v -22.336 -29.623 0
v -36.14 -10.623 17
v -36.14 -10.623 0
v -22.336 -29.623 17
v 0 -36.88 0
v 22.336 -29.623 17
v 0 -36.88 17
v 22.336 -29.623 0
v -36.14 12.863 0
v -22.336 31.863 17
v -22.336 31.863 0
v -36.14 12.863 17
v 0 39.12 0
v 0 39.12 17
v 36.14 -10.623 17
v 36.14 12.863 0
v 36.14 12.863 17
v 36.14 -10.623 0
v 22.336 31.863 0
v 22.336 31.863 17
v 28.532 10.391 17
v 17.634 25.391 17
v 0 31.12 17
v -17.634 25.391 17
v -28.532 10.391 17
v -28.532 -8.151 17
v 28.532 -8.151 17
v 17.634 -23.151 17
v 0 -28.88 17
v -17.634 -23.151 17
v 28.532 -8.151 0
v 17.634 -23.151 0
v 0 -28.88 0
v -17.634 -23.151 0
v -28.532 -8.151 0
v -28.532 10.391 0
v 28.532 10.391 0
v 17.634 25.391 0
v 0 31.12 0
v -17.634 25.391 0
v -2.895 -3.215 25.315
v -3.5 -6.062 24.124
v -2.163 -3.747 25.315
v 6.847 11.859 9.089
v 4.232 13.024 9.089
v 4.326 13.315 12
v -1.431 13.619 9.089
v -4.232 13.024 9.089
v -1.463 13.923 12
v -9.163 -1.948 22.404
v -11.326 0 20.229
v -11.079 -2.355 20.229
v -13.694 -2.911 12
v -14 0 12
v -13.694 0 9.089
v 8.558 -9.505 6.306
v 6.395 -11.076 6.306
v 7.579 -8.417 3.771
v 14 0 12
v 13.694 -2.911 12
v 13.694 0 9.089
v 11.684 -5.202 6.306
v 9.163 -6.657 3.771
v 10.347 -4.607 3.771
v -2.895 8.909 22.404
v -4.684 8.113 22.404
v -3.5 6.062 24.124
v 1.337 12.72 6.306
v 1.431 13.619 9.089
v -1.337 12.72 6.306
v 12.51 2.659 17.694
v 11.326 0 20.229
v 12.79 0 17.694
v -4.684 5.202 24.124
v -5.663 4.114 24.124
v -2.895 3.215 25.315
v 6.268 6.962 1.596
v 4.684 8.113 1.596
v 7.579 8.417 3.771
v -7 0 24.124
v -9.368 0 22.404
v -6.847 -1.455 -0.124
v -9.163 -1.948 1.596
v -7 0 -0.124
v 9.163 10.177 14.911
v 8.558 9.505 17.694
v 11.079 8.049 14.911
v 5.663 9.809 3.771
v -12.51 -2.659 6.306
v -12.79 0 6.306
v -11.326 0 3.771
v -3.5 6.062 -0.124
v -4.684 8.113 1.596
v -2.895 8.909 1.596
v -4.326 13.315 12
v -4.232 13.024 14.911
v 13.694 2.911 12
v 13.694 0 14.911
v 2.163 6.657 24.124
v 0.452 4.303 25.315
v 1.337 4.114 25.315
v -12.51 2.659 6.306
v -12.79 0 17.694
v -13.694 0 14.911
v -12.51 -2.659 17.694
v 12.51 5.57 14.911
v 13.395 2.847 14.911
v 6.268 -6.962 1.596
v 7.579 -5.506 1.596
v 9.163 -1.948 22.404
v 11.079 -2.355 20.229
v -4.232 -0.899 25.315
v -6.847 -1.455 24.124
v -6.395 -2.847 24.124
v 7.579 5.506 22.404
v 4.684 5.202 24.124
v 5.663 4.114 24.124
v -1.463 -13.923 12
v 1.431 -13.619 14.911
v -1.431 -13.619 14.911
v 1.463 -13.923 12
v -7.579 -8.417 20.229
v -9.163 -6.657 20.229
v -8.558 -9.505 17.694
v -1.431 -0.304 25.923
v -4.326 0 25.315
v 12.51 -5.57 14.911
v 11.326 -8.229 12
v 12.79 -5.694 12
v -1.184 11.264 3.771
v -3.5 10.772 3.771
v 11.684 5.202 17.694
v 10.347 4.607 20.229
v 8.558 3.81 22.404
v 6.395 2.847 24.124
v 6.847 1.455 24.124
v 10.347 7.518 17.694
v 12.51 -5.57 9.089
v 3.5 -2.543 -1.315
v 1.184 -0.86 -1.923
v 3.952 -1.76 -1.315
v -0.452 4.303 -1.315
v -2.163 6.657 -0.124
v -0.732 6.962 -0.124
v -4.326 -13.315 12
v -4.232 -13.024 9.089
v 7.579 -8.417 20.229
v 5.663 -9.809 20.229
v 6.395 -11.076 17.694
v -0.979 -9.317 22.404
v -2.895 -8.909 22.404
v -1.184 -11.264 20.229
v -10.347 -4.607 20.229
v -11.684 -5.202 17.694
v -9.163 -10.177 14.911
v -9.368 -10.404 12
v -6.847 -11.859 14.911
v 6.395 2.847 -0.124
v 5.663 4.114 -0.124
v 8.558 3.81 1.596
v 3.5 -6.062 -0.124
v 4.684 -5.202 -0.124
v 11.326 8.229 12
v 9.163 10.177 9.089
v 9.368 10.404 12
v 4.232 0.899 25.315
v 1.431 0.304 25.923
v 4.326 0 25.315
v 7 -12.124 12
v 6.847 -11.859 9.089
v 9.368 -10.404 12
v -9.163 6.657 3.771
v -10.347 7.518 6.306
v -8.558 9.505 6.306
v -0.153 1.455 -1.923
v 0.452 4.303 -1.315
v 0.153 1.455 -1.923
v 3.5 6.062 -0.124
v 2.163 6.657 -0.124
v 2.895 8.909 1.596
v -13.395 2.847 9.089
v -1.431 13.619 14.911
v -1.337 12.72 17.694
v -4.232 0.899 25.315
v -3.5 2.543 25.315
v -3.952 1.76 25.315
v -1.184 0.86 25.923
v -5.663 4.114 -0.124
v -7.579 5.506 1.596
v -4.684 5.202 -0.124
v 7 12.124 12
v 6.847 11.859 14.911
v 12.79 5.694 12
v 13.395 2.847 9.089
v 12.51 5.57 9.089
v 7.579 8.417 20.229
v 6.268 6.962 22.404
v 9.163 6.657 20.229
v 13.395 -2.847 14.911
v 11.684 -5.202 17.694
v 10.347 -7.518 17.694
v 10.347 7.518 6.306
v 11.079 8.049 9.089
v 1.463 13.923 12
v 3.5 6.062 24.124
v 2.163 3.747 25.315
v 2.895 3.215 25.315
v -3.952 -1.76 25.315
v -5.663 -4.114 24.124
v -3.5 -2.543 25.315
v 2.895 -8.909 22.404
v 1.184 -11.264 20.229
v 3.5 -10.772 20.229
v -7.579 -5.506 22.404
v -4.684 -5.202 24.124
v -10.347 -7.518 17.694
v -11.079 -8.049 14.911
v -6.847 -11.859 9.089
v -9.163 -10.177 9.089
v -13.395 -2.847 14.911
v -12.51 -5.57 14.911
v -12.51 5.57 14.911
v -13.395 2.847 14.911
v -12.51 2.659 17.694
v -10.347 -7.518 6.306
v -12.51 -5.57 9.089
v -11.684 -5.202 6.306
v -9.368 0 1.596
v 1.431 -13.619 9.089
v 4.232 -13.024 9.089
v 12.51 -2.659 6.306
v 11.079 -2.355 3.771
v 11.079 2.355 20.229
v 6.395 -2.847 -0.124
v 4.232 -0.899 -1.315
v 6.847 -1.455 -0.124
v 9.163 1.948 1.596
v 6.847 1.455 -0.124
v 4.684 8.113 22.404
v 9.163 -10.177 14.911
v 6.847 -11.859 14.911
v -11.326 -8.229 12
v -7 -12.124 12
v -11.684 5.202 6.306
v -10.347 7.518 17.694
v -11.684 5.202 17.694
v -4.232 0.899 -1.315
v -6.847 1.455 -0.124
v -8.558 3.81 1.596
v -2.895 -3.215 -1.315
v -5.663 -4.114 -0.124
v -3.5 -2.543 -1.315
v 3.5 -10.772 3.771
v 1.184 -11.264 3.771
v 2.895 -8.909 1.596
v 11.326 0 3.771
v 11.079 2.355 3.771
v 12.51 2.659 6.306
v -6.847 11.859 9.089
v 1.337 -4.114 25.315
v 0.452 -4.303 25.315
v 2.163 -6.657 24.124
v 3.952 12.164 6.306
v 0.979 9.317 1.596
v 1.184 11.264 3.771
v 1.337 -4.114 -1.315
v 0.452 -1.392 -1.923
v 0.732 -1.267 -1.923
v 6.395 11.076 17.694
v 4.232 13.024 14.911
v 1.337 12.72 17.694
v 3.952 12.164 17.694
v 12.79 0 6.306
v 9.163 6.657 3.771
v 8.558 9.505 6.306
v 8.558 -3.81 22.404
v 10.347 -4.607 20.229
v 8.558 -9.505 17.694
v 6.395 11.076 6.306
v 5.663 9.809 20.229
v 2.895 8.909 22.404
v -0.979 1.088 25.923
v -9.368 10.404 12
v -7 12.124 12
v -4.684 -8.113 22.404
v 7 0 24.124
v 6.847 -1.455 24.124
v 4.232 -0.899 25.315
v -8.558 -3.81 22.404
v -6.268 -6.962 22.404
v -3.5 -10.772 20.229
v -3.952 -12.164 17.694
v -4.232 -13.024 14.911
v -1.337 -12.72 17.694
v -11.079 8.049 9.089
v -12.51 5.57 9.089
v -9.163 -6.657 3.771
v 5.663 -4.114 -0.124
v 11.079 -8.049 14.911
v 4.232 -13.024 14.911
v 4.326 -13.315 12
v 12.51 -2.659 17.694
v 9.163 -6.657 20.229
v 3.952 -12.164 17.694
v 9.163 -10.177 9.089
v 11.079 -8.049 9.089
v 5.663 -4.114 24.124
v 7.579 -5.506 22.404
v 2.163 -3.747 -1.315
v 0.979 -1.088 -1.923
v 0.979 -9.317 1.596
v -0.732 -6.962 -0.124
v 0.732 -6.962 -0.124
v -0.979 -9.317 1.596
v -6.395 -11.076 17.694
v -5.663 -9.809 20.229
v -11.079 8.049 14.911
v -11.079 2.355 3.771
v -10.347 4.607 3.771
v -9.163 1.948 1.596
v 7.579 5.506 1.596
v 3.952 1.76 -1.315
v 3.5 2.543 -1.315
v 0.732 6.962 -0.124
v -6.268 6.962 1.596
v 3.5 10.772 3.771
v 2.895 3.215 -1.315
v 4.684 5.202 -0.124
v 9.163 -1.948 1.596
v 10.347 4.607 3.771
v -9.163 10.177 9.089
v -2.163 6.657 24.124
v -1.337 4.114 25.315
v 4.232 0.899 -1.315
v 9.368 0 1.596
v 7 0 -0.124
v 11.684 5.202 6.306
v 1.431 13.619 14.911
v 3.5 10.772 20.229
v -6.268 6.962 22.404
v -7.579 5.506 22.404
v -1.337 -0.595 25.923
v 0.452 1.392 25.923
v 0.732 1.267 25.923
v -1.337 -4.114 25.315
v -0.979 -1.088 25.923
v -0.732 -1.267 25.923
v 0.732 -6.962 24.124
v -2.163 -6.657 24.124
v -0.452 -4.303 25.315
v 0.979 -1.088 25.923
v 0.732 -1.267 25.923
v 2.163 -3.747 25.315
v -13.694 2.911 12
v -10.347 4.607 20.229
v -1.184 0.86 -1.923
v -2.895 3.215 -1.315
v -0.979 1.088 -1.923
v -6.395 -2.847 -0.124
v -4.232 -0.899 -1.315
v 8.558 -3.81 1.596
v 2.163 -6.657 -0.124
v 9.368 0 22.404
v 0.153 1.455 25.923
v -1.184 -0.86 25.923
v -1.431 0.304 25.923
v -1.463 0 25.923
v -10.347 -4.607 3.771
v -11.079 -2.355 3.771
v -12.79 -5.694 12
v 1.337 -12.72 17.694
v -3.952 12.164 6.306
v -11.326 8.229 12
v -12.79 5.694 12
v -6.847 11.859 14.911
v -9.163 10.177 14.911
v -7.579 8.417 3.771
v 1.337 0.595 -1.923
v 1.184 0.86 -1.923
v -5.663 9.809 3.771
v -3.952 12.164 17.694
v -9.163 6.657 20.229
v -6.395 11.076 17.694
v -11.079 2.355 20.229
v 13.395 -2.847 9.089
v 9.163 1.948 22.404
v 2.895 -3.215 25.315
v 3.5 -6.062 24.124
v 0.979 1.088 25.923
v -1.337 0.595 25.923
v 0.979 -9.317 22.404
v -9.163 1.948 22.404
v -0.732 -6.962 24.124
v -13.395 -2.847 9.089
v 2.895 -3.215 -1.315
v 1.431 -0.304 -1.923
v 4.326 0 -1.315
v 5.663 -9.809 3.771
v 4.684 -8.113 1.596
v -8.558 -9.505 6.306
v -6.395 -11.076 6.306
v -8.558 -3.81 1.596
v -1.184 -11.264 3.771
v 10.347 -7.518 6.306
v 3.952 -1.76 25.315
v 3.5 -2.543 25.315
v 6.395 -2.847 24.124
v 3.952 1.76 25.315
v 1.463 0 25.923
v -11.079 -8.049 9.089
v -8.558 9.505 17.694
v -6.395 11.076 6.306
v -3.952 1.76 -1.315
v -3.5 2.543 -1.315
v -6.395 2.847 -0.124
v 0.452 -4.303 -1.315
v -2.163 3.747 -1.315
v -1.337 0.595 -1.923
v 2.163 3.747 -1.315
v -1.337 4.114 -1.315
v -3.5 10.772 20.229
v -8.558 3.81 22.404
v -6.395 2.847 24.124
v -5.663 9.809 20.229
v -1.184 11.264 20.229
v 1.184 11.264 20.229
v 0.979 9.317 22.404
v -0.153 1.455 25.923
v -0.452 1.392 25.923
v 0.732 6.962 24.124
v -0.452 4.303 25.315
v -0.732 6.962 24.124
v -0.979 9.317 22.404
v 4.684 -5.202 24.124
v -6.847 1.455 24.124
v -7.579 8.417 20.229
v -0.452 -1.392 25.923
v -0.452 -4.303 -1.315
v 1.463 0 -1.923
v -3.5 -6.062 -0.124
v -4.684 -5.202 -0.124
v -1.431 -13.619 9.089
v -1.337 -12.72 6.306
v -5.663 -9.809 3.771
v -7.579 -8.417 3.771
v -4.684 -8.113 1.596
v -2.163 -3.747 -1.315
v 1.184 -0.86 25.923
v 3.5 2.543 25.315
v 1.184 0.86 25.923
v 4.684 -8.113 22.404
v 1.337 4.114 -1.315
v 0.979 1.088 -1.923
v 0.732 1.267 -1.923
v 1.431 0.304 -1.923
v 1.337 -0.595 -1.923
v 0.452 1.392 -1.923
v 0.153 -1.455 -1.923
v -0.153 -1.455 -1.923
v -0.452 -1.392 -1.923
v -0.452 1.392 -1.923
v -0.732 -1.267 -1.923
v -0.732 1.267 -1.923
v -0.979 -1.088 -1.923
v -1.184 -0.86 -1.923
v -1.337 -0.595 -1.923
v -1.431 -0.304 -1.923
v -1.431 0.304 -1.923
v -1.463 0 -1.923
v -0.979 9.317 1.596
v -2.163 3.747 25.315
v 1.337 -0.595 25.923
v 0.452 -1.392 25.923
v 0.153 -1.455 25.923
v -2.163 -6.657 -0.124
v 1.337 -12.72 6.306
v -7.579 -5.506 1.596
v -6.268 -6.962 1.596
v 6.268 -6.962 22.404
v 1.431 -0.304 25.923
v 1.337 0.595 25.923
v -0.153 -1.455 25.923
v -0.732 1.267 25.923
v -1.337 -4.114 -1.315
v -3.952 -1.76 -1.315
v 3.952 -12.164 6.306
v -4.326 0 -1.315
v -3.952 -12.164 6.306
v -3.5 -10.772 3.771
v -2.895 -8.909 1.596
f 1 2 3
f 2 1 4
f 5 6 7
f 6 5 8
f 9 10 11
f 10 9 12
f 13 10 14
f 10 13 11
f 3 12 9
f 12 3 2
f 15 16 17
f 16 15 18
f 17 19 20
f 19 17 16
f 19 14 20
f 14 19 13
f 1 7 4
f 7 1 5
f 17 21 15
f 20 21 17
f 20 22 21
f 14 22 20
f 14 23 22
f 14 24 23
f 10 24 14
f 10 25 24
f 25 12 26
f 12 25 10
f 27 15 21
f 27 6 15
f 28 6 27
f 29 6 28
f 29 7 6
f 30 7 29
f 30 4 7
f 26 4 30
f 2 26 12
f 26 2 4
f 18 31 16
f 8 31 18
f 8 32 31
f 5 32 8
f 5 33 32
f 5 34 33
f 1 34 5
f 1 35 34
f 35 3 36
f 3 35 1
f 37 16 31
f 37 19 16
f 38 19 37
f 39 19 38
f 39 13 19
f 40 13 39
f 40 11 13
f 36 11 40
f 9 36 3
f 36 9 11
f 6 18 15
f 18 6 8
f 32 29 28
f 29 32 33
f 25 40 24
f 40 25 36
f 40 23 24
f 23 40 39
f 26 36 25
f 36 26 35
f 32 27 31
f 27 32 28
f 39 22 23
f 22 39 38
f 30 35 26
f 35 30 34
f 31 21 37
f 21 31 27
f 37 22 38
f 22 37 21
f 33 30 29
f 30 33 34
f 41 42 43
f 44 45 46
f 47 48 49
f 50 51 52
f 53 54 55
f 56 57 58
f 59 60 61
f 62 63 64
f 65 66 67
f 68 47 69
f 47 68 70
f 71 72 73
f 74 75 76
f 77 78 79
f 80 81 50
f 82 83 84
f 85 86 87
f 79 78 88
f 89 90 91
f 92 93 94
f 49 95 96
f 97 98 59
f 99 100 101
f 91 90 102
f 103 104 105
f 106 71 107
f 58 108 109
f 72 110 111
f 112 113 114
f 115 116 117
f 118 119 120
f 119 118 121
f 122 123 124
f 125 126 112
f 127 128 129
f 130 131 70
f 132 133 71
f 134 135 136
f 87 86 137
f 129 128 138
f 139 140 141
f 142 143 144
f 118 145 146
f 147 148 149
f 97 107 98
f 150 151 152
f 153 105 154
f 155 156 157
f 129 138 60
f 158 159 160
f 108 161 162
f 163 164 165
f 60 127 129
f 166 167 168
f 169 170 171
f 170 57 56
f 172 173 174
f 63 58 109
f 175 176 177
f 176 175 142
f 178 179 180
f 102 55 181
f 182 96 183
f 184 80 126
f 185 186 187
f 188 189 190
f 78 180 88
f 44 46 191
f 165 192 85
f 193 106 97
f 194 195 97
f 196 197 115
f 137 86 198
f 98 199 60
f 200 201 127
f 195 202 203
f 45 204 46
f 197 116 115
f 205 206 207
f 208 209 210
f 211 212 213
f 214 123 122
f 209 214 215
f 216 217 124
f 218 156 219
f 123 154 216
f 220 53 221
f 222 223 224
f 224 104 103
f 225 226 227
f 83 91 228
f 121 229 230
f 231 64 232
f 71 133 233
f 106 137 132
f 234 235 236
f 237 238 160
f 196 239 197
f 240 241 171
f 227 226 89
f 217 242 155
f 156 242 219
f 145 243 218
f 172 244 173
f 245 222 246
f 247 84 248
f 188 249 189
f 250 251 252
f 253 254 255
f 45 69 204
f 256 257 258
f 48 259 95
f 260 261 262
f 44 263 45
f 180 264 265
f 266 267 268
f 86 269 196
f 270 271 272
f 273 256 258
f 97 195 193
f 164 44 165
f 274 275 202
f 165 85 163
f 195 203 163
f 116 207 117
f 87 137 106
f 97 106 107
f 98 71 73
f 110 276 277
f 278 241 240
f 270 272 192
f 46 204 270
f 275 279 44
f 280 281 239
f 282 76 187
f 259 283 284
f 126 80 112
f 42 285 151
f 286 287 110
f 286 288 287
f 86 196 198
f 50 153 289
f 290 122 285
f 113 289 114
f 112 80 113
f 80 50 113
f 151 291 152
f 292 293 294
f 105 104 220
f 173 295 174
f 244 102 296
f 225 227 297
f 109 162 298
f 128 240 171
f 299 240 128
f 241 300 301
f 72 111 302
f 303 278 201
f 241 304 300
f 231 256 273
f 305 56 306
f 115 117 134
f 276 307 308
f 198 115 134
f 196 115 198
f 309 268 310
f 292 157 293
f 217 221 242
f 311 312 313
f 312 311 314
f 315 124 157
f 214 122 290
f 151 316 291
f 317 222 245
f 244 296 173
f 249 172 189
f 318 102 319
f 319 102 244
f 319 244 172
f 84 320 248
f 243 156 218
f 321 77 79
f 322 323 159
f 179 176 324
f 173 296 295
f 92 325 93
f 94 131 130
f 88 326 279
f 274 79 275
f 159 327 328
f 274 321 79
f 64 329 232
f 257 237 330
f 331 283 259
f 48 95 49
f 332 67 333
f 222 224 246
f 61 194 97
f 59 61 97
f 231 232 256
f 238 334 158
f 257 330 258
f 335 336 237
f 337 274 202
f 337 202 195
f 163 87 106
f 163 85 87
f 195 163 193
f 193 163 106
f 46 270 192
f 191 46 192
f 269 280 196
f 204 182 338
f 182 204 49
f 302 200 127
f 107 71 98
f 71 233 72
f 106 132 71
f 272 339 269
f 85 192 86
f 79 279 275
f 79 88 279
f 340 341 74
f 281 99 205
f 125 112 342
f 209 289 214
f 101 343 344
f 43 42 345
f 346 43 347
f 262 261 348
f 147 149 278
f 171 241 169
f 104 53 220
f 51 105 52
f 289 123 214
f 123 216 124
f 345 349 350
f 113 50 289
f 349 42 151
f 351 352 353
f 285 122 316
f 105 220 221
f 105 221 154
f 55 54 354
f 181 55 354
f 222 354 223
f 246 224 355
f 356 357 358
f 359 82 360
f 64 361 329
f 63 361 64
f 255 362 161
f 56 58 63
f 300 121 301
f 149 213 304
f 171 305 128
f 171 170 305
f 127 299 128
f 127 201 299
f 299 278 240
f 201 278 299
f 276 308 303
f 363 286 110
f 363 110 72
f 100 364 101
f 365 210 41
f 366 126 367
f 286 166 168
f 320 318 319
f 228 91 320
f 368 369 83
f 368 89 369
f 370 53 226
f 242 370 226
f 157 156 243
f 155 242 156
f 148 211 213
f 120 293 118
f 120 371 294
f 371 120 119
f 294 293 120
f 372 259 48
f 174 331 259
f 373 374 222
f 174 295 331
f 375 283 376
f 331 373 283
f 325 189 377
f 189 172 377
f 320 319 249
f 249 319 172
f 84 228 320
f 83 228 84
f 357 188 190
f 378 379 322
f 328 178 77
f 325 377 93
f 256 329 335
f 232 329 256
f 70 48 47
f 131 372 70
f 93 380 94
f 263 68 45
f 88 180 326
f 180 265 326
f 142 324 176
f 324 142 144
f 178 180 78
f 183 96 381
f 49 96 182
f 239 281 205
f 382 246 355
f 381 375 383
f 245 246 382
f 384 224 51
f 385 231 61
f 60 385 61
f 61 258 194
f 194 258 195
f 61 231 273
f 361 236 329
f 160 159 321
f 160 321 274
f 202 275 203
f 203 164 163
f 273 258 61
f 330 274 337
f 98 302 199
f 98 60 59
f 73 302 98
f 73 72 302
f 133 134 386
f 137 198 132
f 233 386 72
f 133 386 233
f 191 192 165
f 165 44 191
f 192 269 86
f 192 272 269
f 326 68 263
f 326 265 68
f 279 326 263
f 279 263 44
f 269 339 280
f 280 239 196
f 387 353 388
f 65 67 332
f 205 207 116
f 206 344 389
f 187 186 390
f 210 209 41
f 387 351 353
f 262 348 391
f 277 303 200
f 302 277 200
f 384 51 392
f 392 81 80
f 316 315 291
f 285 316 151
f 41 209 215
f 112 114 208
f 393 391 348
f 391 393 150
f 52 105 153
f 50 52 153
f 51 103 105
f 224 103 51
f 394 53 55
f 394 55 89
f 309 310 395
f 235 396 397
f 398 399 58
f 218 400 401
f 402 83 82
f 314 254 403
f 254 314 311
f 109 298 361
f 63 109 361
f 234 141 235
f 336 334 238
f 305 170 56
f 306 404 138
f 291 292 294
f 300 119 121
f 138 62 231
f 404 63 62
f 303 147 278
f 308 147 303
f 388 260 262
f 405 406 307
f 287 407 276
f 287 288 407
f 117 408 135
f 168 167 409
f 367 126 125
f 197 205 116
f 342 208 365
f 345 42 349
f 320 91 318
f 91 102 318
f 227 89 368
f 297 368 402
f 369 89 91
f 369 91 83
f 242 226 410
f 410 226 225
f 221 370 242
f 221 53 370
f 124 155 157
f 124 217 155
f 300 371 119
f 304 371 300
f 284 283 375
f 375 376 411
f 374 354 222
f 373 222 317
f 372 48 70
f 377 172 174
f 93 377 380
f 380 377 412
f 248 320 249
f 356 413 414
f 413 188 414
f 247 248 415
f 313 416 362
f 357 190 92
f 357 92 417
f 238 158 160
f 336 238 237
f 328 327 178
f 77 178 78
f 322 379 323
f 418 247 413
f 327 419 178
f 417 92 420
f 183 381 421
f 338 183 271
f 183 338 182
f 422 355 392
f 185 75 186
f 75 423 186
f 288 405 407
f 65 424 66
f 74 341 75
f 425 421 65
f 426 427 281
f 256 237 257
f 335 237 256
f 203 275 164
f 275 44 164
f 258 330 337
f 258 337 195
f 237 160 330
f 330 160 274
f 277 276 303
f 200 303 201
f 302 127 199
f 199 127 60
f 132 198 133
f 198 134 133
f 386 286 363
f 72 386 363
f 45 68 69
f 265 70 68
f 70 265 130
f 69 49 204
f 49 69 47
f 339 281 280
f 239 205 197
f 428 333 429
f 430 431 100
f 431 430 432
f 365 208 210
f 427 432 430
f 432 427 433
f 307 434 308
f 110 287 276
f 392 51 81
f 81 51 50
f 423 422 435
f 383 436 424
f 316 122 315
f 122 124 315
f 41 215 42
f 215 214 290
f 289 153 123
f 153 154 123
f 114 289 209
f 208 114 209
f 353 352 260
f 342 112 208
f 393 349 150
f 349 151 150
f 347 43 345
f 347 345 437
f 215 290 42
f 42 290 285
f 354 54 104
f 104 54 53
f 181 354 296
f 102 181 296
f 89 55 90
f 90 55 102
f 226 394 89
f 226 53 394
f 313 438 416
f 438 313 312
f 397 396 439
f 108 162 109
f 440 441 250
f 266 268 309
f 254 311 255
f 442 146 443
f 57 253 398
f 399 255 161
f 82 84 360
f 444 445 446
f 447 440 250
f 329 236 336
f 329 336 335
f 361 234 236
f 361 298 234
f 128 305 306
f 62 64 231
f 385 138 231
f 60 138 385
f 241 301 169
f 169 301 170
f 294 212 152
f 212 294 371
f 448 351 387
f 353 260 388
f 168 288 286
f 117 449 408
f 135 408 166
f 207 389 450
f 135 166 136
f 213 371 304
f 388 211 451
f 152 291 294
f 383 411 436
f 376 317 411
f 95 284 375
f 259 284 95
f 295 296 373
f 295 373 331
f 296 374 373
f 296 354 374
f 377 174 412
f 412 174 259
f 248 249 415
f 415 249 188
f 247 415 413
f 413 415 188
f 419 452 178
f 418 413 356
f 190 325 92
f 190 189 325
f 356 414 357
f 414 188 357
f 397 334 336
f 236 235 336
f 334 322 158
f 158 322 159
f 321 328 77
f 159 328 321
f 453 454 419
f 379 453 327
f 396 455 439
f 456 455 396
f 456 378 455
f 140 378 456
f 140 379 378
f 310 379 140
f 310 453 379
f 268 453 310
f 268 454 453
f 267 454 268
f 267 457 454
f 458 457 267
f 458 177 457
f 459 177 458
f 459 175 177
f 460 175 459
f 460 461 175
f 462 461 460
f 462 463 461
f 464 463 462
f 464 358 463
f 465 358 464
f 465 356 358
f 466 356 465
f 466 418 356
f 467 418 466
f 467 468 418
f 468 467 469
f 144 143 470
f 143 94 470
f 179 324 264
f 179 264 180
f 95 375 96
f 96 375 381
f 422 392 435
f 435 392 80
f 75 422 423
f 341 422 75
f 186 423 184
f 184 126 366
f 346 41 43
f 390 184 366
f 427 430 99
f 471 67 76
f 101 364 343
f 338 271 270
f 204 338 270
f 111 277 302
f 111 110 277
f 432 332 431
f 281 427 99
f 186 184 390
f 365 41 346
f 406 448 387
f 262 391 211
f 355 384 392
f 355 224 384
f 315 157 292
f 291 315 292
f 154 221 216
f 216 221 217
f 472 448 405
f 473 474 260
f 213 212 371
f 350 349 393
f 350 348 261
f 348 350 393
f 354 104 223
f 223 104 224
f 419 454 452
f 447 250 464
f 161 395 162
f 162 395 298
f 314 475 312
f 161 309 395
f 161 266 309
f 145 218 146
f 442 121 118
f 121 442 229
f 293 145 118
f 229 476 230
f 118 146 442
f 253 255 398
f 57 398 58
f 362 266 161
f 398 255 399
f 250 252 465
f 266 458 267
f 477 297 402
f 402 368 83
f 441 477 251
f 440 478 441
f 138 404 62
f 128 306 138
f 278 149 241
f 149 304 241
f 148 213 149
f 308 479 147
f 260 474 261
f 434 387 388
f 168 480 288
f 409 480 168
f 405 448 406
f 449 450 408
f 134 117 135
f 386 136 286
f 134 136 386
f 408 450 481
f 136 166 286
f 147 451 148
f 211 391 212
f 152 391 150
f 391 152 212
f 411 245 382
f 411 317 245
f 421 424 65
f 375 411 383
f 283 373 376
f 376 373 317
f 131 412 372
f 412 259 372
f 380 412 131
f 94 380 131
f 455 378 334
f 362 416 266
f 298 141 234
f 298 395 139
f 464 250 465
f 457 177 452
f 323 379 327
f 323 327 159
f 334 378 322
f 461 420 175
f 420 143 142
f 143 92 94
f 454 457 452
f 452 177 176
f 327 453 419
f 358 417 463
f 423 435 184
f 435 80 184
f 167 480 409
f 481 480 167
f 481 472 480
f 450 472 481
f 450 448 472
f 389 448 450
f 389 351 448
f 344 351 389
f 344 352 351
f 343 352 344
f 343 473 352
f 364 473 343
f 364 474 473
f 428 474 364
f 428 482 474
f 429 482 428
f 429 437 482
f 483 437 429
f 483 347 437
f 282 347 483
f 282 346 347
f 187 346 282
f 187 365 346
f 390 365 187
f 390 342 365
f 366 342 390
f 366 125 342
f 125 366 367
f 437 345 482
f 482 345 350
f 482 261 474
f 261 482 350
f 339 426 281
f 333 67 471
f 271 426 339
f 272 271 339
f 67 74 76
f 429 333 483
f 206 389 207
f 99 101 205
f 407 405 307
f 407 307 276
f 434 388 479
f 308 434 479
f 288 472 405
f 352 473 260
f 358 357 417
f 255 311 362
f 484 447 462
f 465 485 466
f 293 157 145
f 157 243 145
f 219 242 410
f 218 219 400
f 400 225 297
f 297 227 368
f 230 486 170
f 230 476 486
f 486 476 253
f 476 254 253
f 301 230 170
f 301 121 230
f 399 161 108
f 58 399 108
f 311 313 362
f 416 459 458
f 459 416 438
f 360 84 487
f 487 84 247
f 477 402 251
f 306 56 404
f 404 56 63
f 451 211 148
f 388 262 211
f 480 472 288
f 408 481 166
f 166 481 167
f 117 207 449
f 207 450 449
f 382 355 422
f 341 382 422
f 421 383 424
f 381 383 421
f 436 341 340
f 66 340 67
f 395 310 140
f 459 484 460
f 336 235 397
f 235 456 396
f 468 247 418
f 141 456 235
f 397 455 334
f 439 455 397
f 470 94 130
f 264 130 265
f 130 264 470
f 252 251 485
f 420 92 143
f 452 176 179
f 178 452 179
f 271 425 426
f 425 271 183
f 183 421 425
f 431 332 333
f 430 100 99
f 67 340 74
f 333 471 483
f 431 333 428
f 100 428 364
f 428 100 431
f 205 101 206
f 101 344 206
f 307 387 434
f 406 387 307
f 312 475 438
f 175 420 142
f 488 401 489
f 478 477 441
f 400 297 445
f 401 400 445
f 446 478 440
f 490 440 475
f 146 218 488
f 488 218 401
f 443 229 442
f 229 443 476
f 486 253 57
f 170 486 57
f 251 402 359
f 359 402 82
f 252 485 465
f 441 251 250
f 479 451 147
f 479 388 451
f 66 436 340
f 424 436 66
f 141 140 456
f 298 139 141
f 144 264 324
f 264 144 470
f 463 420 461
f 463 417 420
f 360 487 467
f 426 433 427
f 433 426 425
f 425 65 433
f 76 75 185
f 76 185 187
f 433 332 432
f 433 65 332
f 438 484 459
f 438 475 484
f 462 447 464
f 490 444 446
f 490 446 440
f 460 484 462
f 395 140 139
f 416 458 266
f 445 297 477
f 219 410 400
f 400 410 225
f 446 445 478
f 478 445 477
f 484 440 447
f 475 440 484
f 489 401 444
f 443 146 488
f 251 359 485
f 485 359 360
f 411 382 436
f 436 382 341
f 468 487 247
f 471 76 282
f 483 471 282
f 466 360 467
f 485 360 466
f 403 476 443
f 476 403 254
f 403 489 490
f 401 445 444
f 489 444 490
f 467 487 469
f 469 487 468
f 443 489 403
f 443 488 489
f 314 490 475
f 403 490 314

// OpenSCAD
/* Notes:

Bus is not centered on rotation axis (1.12 inch offset towards +Y)
CG of spacecraft is not on rotation axis (

*/


module decagon() {
  //main body of spacecraft, with no details. 10-bay structure, numbered
  //from bay 1 perpendicular to +X. Science boom attached to bays 3 and 4,
  //Gold Record to bay 6, RTGs to bays 8 and 9, star trackers to bay 10
  translate([0,1.12,0])
    rotate([0,0,90])
    difference() {
    cylinder(h=17,r=38,$fn=10);
      translate([0,0,-1])
    cylinder(h=19,r=30,$fn=10);
  }
}

module fueltank() {
    translate([0,0,12])
    sphere(r=14);
}

decagon();
fueltank();
